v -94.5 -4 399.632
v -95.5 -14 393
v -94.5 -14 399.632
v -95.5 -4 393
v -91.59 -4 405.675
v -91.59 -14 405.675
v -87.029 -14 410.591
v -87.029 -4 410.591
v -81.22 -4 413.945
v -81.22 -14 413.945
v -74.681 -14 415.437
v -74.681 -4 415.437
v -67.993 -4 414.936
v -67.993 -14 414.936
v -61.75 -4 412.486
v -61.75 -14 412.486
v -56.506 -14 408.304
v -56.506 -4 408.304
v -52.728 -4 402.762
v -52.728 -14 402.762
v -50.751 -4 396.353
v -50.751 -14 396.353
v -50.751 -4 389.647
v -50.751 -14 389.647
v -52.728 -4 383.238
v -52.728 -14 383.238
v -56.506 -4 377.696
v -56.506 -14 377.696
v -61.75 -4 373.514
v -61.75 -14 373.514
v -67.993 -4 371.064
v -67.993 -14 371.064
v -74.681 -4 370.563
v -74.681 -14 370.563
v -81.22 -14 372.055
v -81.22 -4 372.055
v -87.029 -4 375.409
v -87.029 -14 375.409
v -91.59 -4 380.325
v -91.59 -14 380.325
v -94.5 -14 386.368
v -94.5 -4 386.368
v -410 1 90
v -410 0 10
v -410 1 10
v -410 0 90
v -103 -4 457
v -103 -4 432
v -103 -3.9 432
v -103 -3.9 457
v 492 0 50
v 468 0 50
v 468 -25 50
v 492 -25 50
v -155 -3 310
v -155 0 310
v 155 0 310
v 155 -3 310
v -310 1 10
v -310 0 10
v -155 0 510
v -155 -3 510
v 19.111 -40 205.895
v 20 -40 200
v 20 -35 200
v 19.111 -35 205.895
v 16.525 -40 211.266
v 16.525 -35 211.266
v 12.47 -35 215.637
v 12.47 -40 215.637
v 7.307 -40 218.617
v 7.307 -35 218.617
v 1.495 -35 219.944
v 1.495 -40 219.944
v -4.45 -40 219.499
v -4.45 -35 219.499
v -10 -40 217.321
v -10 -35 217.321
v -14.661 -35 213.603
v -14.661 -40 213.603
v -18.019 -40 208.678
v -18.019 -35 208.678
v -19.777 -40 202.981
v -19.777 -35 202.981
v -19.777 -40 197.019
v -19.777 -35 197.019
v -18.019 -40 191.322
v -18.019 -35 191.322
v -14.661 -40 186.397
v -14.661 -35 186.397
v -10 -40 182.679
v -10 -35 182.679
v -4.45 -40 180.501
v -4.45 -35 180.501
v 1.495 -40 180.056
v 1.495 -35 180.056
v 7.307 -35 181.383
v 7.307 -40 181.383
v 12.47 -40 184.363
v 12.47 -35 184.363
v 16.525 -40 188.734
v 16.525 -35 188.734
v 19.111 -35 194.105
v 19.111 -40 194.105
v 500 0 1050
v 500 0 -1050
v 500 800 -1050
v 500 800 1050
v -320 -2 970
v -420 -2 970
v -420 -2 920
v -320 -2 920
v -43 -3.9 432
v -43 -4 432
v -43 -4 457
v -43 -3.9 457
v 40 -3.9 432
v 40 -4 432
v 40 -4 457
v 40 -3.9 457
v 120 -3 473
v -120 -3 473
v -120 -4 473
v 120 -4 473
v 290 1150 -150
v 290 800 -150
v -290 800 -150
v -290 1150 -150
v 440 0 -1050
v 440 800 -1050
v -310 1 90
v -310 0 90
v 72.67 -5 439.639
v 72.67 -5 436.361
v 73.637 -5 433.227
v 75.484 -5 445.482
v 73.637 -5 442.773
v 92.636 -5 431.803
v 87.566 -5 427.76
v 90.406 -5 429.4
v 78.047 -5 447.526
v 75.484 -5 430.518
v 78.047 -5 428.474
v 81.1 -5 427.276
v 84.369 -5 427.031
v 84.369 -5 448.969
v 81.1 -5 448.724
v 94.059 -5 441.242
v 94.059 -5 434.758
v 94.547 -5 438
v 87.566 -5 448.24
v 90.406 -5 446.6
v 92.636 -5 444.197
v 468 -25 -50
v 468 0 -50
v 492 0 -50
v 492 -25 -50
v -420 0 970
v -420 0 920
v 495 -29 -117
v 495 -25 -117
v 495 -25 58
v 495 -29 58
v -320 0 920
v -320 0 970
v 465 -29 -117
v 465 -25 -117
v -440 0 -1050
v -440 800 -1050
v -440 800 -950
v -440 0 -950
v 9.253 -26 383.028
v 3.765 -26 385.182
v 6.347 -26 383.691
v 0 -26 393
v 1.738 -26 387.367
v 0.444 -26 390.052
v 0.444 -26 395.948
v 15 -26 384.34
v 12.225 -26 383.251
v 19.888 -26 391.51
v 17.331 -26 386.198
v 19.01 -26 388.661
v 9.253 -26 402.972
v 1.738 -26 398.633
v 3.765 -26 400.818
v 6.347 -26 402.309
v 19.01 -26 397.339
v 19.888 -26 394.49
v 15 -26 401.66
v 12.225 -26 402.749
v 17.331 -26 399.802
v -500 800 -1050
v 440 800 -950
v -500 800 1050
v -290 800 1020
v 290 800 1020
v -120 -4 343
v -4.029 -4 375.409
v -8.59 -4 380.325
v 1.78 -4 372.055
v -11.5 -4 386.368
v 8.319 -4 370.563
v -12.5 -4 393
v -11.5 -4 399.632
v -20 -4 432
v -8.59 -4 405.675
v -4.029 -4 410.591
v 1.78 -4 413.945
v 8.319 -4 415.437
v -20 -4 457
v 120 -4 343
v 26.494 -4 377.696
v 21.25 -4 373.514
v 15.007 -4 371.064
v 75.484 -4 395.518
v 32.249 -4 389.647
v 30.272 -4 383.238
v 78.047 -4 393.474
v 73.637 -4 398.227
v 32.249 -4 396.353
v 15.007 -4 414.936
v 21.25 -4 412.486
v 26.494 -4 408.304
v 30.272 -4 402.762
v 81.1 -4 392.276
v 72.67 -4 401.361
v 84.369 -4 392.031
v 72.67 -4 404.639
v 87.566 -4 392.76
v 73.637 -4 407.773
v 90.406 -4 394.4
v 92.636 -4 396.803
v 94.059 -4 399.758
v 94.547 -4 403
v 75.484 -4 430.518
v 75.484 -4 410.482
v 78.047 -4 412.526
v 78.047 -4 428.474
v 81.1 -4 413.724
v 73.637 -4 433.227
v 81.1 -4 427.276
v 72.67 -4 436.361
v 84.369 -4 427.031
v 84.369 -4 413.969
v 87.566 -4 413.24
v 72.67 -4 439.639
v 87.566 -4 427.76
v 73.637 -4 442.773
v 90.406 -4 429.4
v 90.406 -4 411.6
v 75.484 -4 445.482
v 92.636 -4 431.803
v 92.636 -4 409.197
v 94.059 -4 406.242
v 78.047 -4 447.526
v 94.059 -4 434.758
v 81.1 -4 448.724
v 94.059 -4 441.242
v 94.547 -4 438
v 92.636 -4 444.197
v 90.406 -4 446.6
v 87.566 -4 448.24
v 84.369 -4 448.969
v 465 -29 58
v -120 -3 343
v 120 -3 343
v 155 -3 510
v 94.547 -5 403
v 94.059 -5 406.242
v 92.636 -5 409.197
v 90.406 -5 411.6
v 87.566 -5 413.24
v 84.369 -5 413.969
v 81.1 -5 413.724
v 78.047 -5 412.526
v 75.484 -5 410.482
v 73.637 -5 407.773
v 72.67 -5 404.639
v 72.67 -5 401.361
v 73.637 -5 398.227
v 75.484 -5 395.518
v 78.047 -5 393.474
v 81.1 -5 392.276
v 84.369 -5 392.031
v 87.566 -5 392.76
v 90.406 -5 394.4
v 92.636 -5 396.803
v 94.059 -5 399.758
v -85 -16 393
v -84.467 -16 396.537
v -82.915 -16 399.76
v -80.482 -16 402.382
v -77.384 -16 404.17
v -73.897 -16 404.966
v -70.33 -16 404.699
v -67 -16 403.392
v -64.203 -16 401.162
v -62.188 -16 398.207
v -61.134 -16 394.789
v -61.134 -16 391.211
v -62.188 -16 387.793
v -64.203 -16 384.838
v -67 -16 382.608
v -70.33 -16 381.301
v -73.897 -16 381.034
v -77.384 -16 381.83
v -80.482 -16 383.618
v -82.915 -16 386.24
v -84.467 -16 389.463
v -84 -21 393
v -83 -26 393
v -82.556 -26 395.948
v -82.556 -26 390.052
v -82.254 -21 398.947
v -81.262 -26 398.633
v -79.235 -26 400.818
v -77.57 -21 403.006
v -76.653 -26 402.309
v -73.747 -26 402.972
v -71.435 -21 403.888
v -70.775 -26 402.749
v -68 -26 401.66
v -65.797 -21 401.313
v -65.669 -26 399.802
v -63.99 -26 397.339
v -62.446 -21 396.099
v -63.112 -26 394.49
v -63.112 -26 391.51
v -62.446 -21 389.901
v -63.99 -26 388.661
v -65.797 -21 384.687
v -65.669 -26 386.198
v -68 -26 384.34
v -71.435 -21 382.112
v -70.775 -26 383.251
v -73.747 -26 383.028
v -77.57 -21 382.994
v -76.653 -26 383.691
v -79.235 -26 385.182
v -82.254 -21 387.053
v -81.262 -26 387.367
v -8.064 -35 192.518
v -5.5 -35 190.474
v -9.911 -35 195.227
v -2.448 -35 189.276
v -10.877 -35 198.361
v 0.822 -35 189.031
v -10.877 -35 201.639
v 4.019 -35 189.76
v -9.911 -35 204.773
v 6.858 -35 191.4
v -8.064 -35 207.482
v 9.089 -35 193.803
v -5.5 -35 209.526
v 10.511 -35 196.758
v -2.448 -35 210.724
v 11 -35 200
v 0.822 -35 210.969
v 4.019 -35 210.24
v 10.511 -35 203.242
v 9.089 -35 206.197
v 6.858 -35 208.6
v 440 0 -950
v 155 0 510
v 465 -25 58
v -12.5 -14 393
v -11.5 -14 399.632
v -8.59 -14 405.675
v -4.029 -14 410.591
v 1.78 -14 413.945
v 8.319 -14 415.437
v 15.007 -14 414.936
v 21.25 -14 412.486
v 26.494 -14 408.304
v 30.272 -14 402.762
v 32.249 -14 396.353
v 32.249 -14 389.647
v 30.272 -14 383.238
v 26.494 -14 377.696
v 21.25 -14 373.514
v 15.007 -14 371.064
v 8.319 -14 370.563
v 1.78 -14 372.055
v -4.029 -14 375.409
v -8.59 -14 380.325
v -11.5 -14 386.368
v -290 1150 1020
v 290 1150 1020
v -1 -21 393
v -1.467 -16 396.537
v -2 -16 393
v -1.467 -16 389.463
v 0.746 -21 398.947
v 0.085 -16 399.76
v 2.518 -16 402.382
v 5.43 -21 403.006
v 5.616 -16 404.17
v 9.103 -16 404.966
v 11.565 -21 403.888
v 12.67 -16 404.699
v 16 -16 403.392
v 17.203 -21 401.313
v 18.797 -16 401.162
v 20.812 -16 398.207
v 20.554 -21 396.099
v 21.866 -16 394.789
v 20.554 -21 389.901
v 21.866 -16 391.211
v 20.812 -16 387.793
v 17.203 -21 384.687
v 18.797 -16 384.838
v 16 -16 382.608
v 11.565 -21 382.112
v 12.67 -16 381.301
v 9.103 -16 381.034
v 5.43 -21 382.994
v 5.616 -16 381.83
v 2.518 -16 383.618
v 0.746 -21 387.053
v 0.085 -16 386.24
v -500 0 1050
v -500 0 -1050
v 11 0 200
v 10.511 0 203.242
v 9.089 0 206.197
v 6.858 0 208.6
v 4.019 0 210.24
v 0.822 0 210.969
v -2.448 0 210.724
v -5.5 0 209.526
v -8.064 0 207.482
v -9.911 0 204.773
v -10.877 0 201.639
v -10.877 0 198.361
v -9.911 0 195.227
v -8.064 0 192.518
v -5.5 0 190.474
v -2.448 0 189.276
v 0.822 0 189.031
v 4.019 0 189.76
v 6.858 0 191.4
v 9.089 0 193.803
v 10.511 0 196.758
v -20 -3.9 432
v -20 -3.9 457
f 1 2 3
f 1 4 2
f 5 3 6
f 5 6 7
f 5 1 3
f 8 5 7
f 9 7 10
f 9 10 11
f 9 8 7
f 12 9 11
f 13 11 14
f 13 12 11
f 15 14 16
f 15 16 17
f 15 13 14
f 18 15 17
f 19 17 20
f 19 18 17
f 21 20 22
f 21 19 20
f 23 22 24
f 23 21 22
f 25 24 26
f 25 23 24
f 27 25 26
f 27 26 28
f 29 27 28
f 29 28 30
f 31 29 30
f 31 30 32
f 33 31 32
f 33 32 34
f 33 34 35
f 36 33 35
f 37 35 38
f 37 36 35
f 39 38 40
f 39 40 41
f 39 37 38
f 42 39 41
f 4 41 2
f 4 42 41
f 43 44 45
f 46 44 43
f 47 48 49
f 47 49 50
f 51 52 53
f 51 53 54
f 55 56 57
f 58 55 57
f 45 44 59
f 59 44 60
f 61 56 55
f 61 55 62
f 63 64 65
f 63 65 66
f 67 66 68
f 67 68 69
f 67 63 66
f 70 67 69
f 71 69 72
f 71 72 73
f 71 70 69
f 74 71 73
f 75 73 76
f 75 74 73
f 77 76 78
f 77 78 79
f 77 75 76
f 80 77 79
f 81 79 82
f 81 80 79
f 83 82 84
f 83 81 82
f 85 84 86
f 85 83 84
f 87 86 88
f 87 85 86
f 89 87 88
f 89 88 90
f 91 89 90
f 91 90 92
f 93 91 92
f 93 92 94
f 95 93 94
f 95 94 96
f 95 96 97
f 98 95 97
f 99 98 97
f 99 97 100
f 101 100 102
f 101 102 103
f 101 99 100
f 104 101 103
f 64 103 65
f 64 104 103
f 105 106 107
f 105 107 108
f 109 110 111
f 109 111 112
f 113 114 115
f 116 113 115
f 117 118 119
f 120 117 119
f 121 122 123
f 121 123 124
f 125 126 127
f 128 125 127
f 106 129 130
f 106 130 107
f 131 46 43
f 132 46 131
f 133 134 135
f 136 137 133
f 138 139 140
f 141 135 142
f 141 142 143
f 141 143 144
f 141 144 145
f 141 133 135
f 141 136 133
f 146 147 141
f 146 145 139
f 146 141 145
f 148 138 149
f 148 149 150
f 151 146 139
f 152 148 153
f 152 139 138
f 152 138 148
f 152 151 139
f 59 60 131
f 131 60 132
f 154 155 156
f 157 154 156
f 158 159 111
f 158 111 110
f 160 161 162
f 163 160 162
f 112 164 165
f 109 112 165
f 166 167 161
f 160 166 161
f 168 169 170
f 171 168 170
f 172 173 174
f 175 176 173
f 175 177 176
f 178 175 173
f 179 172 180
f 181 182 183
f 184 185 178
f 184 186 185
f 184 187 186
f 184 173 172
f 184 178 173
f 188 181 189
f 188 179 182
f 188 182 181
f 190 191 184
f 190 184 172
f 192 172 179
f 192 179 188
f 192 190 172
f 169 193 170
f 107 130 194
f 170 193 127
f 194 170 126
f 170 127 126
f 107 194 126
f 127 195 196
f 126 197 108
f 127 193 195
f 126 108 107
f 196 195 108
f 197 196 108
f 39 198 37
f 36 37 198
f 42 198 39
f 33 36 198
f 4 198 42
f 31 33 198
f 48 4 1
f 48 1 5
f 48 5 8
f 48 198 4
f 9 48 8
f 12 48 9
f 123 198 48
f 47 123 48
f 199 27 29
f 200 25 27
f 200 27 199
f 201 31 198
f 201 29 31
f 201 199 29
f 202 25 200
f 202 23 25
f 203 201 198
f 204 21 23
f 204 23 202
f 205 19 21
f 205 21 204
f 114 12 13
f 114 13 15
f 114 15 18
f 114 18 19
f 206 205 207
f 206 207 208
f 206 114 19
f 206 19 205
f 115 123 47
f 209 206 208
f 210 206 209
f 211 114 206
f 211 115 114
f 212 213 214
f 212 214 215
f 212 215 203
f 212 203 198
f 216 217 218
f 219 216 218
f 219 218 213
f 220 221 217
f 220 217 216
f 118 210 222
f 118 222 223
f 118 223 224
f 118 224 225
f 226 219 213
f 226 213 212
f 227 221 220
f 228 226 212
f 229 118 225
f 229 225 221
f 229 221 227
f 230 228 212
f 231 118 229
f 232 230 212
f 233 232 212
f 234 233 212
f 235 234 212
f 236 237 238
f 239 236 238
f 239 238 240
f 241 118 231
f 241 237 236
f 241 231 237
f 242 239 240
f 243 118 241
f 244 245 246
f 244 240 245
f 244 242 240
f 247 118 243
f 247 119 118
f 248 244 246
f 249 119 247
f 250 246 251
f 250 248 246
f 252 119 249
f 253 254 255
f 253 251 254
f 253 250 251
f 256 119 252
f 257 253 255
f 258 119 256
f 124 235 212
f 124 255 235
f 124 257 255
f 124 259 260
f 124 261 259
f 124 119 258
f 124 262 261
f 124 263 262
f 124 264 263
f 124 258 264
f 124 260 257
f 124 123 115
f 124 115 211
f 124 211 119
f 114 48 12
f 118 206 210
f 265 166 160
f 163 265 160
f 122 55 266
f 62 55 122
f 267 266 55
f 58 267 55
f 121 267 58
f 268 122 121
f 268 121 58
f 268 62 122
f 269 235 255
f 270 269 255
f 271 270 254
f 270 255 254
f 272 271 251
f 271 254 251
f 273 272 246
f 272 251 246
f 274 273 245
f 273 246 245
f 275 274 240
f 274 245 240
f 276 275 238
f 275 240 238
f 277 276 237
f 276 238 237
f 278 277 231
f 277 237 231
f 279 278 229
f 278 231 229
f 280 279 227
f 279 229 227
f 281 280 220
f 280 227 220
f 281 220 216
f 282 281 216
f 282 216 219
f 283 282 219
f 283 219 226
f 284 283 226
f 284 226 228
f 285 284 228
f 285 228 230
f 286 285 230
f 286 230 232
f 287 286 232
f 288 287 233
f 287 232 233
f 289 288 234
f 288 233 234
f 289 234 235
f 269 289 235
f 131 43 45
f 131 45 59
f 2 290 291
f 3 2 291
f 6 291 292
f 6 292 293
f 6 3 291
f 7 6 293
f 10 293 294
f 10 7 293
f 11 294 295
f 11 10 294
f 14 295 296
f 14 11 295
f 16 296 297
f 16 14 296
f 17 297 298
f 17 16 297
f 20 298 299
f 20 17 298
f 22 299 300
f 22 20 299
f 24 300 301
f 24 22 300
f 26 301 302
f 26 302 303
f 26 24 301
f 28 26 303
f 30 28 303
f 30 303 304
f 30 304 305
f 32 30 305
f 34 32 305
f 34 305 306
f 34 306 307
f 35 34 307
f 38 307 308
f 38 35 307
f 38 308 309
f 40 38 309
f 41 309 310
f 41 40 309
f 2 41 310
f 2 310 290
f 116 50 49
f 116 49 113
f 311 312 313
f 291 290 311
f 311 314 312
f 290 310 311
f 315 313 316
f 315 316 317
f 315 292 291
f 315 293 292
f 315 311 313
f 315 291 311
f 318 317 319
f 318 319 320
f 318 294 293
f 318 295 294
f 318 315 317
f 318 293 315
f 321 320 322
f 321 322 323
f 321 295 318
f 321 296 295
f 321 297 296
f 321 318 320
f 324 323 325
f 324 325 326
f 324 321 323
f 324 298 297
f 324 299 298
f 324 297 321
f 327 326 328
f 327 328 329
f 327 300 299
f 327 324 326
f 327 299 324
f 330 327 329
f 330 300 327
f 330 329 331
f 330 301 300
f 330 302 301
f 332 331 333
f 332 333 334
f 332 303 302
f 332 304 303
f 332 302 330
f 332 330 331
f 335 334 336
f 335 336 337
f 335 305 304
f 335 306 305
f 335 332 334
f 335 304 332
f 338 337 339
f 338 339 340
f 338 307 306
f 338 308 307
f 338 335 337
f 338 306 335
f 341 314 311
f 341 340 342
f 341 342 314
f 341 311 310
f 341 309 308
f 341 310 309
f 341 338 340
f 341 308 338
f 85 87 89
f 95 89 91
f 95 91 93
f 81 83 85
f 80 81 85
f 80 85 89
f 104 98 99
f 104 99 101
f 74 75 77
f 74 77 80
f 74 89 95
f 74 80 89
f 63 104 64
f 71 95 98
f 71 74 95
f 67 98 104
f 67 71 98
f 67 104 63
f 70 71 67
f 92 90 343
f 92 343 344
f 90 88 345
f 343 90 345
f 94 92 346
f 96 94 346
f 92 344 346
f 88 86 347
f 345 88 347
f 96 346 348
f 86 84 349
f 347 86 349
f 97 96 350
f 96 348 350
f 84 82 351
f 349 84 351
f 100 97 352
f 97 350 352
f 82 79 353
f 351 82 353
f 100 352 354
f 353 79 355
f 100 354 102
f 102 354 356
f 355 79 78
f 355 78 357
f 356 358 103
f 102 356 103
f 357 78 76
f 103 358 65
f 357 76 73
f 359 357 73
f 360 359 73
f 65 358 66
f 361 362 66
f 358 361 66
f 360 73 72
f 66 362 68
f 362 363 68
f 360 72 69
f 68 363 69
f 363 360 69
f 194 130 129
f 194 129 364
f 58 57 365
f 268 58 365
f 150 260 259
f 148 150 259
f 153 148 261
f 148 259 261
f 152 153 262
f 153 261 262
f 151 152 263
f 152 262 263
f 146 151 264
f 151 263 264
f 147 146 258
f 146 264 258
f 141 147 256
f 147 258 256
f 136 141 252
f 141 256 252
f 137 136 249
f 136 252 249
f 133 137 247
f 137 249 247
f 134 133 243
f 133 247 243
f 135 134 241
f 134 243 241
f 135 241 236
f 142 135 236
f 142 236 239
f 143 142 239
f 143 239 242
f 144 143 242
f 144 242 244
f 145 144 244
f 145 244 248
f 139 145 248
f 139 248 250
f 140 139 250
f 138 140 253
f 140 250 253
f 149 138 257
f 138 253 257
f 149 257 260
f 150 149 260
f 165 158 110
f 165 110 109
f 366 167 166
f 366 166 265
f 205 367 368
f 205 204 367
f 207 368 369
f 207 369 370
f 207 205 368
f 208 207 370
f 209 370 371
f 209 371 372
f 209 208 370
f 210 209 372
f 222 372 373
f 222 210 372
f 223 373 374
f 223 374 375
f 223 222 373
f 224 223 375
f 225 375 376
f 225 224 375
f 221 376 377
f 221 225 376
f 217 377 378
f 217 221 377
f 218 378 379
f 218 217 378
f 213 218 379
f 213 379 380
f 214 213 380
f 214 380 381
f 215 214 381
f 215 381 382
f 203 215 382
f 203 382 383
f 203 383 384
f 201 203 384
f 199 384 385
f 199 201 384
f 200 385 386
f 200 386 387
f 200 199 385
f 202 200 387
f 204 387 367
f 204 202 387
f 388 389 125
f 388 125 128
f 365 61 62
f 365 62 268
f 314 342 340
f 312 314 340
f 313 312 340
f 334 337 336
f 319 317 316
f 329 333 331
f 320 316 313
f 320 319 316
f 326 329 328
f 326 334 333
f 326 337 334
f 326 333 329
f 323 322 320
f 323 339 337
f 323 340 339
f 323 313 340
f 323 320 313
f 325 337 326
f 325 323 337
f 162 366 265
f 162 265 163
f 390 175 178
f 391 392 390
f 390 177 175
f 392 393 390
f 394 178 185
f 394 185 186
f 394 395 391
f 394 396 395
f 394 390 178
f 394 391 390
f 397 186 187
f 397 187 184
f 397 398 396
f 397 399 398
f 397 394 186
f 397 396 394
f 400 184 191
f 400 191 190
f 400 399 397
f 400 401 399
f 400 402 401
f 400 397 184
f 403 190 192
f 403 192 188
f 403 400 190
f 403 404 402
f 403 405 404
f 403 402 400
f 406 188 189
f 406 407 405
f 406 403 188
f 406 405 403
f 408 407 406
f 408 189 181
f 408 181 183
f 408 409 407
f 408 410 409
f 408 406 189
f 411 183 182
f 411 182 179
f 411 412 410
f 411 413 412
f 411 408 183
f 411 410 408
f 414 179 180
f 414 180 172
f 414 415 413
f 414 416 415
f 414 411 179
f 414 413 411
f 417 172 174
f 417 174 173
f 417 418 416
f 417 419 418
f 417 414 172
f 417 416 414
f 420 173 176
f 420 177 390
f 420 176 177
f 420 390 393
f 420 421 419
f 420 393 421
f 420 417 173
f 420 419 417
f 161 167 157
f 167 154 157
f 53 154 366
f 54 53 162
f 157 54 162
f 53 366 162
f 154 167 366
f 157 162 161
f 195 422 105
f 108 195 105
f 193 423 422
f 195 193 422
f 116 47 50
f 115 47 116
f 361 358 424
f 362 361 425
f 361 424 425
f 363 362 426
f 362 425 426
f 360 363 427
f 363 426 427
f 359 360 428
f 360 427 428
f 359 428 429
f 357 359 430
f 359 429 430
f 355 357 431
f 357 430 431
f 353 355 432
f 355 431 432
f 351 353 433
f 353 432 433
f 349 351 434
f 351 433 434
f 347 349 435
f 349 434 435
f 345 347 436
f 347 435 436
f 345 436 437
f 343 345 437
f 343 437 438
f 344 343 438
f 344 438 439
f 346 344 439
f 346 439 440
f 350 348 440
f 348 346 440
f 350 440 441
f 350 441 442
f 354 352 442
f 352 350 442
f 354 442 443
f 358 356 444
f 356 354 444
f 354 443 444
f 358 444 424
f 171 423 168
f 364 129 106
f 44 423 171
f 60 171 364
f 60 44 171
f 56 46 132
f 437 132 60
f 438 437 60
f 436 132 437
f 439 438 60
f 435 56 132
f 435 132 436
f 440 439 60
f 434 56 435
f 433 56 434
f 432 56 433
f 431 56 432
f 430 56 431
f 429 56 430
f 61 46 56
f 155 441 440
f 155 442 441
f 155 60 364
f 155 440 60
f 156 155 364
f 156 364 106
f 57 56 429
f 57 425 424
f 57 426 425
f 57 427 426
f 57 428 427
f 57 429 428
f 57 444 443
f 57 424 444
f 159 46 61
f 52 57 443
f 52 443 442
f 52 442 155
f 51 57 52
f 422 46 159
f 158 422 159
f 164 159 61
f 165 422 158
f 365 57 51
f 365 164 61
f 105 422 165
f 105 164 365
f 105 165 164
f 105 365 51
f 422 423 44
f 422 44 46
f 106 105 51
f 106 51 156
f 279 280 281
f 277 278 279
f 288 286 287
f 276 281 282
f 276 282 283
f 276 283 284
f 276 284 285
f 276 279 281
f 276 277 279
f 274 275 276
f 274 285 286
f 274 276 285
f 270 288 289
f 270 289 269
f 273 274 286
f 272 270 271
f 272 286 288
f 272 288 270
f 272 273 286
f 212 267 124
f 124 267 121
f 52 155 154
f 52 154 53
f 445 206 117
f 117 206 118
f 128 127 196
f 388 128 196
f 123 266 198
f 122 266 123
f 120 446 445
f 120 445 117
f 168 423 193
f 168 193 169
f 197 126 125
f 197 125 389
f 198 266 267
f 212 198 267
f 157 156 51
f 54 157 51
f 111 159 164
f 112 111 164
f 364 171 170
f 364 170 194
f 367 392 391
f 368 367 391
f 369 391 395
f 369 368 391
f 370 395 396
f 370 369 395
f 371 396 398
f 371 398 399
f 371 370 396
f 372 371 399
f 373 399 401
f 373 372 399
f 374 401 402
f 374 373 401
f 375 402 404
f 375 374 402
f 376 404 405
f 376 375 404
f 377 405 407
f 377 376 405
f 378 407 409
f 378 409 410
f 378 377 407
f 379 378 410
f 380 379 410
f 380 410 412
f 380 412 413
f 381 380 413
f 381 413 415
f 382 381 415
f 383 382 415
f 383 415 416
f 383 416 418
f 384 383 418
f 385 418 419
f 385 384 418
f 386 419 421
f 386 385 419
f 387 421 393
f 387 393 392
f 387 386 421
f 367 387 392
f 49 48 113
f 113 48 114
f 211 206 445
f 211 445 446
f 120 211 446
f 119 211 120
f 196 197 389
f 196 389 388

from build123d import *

# Parameters (mm, degrees)
F0_W      = 1000
F0_H      = 2100
F1_DEPTH  = 800
F2_W      = 580
F2_H      = 1170
F3_DEPTH  = 350
F4_R      = 11
F5_DEPTH  = 40
F6_R      = 20
F7_DEPTH  = 5
F8_W      = 310
F8_H      = 200
F9_DEPTH  = 3
F10_W     = 100
F10_H     = 80
F11_DEPTH = 1
F12_W     = 880
F12_H     = 100
F13_DEPTH = 1150.001
F14_W     = 24
F14_H     = 100
F15_DEPTH = 25
F16_W     = 100
F16_H     = 50
F17_DEPTH = 2
F18_W     = 30
F18_H     = 175
F19_DEPTH = 4
F20_W     = 240
F20_H     = 130
F21_DEPTH = 1
F22_W     = 60
F22_H     = 25
F23_DEPTH = 0.1
F29_R     = 11
F30_DEPTH = 1


with BuildPart() as f1:
    # F0 (on Front) → F1 (new body)
    with BuildSketch(Plane.XZ):
        Rectangle(F0_W, F0_H)
    extrude(amount=-F1_DEPTH)

    # F2 (on face) → F3 (join)
    with BuildSketch(Plane(origin=(0, 800, 0), x_dir=(-1, 0, 0), z_dir=(0, 1, 0))):
        with Locations((0, 435)):
            Rectangle(F2_W, F2_H)
    extrude(amount=F3_DEPTH)

    # F4 (on face) → F5 (join)
    with BuildSketch(Plane.XZ):
        with Locations((0, 200)):
            Circle(F4_R)
    extrude(amount=F5_DEPTH)

    # F6 (on face) → F7 (join)
    with BuildSketch(Plane.XZ.offset(40)):
        with Locations((0, 200)):
            Circle(F6_R)
    extrude(amount=-F7_DEPTH)

    # F8 (on face) → F9 (join)
    with BuildSketch(Plane.XZ):
        with Locations((0, 410)):
            Rectangle(F8_W, F8_H)
    extrude(amount=F9_DEPTH)

    # F10 (on face) → F11 (cut)
    with BuildSketch(Plane.XZ):
        with Locations((-360, 50)):
            Rectangle(F10_W, F10_H)
    extrude(amount=-F11_DEPTH, mode=Mode.SUBTRACT)

    # F12 (on face) → F13 (cut, through all)
    with BuildSketch(Plane.XZ):
        with Locations((0, -1000)):
            Rectangle(F12_W, F12_H)
    extrude(amount=-F13_DEPTH, mode=Mode.SUBTRACT)

    # F14 (on face) → F15 (join)
    with BuildSketch(Plane.XZ):
        with Locations((480, 0)):
            Rectangle(F14_W, F14_H)
    extrude(amount=F15_DEPTH)

    # F16 (on face) → F17 (join)
    with BuildSketch(Plane.XZ):
        with Locations((-370, 945)):
            Rectangle(F16_W, F16_H)
    extrude(amount=F17_DEPTH)

    # F18 (on face) → F19 (join)
    with BuildSketch(Plane.XZ.offset(25)):
        with Locations((480, -29.5)):
            Rectangle(F18_W, F18_H)
    extrude(amount=F19_DEPTH)

    # F20 (on face) → F21 (join)
    with BuildSketch(Plane.XZ.offset(3)):
        with Locations((0, 408)):
            Rectangle(F20_W, F20_H)
    extrude(amount=F21_DEPTH)

    # F22 (on face) → F23 (cut)
    with BuildSketch(Plane.XZ.offset(4)):
        with Locations((-73, 444.5)):
            Rectangle(F22_W, F22_H)
        with Locations((10, 444.5)):
            Rectangle(F22_W, F22_H)
    extrude(amount=-F23_DEPTH, mode=Mode.SUBTRACT)

    # F26 (on plane+point) → F27 (revolve)
    with BuildSketch(Plane(origin=(0, 0, 393), x_dir=(1, 0, 0), z_dir=(0, 0, -1))):
        Polygon((-95.5, 4), (-73, 4), (-73, 26), (-83, 26), (-85, 16), (-95.5, 14), align=None)
    revolve(axis=Axis((-73, -17.4706345424, 393), (0, 1, 0)))

    # F26 (on plane+point) → F28 (revolve)
    with BuildSketch(Plane(origin=(0, 0, 393), x_dir=(1, 0, 0), z_dir=(0, 0, -1))):
        Polygon((-12.5, 4), (10, 4), (10, 26), (0, 26), (-2, 16), (-12.5, 14), align=None)
    revolve(axis=Axis((10, -12.9324262962, 393), (0, 1, 0)))

    # F29 (on face) → F30 (join)
    with BuildSketch(Plane.XZ.offset(4)):
        with Locations((83.5474357009, 438)):
            Circle(F29_R)
        with Locations((83.5474357009, 403)):
            Circle(F29_R)
    extrude(amount=F30_DEPTH)


solid = f1.part
